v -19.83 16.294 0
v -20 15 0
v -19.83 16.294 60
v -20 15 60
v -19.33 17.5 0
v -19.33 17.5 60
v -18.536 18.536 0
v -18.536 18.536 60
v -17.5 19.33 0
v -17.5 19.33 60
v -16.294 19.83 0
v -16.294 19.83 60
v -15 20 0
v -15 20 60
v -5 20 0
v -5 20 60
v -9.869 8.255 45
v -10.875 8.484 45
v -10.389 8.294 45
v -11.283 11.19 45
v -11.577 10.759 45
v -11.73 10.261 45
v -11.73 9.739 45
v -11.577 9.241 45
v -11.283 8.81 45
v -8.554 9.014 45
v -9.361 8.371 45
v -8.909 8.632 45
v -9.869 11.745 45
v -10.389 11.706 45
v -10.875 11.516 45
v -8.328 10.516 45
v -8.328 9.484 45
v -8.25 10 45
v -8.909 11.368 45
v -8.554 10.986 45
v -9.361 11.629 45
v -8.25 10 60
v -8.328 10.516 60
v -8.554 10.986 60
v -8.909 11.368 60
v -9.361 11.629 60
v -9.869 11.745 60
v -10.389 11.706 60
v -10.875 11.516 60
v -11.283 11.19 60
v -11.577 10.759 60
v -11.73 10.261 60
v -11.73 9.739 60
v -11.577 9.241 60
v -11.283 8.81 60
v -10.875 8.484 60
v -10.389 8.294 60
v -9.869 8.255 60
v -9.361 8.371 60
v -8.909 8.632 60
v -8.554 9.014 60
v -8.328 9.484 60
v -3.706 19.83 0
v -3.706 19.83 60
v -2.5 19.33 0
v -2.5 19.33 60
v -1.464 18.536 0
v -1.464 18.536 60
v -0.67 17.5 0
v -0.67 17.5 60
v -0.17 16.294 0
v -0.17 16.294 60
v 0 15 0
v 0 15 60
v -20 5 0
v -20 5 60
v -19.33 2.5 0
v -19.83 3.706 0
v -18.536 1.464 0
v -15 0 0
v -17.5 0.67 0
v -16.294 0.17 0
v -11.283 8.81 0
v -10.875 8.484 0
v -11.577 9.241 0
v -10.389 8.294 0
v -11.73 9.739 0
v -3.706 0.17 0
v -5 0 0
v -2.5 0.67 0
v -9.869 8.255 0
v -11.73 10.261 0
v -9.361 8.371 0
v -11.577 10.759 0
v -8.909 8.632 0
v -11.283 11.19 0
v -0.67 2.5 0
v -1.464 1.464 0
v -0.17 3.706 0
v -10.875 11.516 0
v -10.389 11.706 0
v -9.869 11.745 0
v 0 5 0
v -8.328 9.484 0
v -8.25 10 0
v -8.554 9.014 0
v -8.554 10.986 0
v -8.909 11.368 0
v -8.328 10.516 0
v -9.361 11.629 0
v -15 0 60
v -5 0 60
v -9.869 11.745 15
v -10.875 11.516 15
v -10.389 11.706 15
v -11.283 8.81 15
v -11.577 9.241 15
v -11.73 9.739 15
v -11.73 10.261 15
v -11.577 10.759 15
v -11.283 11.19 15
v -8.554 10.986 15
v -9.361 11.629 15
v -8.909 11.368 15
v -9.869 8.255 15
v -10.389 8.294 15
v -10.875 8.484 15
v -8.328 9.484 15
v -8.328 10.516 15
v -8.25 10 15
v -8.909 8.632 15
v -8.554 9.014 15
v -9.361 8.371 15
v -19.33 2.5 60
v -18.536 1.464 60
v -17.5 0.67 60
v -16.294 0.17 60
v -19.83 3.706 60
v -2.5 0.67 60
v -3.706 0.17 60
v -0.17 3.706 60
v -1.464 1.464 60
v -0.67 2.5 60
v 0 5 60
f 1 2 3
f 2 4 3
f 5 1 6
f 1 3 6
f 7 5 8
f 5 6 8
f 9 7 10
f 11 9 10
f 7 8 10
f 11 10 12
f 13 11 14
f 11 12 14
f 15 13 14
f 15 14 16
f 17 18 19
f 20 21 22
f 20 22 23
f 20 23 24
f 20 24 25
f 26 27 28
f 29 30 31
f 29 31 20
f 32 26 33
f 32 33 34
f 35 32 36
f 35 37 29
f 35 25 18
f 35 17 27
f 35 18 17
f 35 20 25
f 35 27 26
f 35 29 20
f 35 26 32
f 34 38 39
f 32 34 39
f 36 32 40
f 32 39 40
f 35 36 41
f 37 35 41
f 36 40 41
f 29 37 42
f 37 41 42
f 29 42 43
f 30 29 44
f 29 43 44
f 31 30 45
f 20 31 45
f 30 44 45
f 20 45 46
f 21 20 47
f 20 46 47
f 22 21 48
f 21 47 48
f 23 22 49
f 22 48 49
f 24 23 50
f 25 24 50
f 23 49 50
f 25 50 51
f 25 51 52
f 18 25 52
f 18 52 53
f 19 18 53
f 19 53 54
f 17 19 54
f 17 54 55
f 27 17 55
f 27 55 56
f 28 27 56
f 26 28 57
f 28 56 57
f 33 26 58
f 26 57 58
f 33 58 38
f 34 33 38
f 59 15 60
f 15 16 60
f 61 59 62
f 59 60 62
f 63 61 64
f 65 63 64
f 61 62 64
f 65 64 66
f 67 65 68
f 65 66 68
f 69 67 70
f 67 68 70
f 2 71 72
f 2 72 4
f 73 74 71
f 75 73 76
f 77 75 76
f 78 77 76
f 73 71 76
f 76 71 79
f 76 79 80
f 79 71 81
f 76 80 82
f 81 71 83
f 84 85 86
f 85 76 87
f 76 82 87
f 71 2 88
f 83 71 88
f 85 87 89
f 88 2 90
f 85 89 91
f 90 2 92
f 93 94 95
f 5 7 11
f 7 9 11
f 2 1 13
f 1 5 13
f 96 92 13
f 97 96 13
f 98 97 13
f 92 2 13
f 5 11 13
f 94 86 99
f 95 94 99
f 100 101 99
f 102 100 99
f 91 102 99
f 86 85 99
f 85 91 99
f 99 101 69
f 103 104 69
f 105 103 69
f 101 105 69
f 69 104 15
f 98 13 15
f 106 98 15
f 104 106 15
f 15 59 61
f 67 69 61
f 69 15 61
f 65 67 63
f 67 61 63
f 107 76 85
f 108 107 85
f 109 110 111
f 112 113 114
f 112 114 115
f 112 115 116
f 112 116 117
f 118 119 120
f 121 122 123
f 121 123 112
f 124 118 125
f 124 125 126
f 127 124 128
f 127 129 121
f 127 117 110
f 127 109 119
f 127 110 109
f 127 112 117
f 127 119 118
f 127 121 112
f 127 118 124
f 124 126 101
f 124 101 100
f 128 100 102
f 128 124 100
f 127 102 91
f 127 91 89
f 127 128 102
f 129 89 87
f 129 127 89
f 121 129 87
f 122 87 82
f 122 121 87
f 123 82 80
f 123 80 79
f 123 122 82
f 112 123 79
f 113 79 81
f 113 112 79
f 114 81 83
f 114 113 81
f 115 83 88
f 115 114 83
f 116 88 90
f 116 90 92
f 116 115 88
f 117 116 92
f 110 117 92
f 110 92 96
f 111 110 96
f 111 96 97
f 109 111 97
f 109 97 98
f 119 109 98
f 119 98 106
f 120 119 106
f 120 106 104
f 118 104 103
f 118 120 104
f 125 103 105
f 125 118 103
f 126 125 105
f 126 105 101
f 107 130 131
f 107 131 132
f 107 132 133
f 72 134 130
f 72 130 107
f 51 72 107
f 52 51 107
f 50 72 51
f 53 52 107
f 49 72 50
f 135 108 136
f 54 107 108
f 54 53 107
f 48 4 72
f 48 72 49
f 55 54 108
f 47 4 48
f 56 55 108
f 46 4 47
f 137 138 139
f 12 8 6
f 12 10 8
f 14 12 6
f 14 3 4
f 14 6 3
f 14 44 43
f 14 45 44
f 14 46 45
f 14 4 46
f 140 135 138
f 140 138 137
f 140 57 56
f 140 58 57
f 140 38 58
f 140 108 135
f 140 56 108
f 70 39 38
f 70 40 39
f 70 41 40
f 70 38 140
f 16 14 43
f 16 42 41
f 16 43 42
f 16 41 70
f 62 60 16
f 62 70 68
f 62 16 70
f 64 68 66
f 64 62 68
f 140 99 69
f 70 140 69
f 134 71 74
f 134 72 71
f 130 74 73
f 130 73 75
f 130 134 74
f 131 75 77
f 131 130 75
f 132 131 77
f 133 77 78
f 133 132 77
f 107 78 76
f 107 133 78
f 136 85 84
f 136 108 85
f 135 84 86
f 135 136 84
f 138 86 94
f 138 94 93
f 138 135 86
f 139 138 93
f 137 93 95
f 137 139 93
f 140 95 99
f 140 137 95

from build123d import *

# Parameters (mm, degrees)
ESQUISSE1_W             = 20
ESQUISSE1_H             = 20
BOSS_EXTRU_1_DEPTH      = 60
ESQUISSE2_R             = 1.75
ENL_V_MAT_EXTRU_1_DEPTH = 15
ENL_V_START             = -15
ESQUISSE3_R             = 1.75
ENL_V_MAT_EXTRU_2_DEPTH = 15
CONG_1_R                = 5


with BuildPart() as part:
    # Esquisse1 → Boss.-Extru.1 (new body)
    with BuildSketch(Plane.XY):
        with Locations((-10, 10)):
            Rectangle(ESQUISSE1_W, ESQUISSE1_H)
    extrude(amount=BOSS_EXTRU_1_DEPTH)

    # Esquisse2 → Enlèv. mat.-Extru.1 (cut)
    with BuildSketch(Plane.XY.offset(60)):
        with Locations((-10, 10)):
            Circle(ESQUISSE2_R)
    extrude(amount=-ENL_V_MAT_EXTRU_1_DEPTH, mode=Mode.SUBTRACT)

    # Esquisse3 → Enlèv. mat.-Extru.2 (cut)
    with BuildSketch(Plane(origin=(0, 0, 0), x_dir=(-1, 0, 0), z_dir=(0, 0, -1)).offset(ENL_V_START)):
        with Locations(Location((10, 10, 0), (0, 0, 180))):
            Circle(ESQUISSE3_R)
    extrude(amount=ENL_V_MAT_EXTRU_2_DEPTH, mode=Mode.SUBTRACT)

    # Congé1
    cong_1_edges = [part.edges().sort_by_distance(p)[0] for p in [
        (0, 0, 30),
        (-20, 0, 30),
        (-20, 20, 30),
        (0, 20, 30),
    ]]
    fillet(cong_1_edges, radius=CONG_1_R)


solid = part.part
